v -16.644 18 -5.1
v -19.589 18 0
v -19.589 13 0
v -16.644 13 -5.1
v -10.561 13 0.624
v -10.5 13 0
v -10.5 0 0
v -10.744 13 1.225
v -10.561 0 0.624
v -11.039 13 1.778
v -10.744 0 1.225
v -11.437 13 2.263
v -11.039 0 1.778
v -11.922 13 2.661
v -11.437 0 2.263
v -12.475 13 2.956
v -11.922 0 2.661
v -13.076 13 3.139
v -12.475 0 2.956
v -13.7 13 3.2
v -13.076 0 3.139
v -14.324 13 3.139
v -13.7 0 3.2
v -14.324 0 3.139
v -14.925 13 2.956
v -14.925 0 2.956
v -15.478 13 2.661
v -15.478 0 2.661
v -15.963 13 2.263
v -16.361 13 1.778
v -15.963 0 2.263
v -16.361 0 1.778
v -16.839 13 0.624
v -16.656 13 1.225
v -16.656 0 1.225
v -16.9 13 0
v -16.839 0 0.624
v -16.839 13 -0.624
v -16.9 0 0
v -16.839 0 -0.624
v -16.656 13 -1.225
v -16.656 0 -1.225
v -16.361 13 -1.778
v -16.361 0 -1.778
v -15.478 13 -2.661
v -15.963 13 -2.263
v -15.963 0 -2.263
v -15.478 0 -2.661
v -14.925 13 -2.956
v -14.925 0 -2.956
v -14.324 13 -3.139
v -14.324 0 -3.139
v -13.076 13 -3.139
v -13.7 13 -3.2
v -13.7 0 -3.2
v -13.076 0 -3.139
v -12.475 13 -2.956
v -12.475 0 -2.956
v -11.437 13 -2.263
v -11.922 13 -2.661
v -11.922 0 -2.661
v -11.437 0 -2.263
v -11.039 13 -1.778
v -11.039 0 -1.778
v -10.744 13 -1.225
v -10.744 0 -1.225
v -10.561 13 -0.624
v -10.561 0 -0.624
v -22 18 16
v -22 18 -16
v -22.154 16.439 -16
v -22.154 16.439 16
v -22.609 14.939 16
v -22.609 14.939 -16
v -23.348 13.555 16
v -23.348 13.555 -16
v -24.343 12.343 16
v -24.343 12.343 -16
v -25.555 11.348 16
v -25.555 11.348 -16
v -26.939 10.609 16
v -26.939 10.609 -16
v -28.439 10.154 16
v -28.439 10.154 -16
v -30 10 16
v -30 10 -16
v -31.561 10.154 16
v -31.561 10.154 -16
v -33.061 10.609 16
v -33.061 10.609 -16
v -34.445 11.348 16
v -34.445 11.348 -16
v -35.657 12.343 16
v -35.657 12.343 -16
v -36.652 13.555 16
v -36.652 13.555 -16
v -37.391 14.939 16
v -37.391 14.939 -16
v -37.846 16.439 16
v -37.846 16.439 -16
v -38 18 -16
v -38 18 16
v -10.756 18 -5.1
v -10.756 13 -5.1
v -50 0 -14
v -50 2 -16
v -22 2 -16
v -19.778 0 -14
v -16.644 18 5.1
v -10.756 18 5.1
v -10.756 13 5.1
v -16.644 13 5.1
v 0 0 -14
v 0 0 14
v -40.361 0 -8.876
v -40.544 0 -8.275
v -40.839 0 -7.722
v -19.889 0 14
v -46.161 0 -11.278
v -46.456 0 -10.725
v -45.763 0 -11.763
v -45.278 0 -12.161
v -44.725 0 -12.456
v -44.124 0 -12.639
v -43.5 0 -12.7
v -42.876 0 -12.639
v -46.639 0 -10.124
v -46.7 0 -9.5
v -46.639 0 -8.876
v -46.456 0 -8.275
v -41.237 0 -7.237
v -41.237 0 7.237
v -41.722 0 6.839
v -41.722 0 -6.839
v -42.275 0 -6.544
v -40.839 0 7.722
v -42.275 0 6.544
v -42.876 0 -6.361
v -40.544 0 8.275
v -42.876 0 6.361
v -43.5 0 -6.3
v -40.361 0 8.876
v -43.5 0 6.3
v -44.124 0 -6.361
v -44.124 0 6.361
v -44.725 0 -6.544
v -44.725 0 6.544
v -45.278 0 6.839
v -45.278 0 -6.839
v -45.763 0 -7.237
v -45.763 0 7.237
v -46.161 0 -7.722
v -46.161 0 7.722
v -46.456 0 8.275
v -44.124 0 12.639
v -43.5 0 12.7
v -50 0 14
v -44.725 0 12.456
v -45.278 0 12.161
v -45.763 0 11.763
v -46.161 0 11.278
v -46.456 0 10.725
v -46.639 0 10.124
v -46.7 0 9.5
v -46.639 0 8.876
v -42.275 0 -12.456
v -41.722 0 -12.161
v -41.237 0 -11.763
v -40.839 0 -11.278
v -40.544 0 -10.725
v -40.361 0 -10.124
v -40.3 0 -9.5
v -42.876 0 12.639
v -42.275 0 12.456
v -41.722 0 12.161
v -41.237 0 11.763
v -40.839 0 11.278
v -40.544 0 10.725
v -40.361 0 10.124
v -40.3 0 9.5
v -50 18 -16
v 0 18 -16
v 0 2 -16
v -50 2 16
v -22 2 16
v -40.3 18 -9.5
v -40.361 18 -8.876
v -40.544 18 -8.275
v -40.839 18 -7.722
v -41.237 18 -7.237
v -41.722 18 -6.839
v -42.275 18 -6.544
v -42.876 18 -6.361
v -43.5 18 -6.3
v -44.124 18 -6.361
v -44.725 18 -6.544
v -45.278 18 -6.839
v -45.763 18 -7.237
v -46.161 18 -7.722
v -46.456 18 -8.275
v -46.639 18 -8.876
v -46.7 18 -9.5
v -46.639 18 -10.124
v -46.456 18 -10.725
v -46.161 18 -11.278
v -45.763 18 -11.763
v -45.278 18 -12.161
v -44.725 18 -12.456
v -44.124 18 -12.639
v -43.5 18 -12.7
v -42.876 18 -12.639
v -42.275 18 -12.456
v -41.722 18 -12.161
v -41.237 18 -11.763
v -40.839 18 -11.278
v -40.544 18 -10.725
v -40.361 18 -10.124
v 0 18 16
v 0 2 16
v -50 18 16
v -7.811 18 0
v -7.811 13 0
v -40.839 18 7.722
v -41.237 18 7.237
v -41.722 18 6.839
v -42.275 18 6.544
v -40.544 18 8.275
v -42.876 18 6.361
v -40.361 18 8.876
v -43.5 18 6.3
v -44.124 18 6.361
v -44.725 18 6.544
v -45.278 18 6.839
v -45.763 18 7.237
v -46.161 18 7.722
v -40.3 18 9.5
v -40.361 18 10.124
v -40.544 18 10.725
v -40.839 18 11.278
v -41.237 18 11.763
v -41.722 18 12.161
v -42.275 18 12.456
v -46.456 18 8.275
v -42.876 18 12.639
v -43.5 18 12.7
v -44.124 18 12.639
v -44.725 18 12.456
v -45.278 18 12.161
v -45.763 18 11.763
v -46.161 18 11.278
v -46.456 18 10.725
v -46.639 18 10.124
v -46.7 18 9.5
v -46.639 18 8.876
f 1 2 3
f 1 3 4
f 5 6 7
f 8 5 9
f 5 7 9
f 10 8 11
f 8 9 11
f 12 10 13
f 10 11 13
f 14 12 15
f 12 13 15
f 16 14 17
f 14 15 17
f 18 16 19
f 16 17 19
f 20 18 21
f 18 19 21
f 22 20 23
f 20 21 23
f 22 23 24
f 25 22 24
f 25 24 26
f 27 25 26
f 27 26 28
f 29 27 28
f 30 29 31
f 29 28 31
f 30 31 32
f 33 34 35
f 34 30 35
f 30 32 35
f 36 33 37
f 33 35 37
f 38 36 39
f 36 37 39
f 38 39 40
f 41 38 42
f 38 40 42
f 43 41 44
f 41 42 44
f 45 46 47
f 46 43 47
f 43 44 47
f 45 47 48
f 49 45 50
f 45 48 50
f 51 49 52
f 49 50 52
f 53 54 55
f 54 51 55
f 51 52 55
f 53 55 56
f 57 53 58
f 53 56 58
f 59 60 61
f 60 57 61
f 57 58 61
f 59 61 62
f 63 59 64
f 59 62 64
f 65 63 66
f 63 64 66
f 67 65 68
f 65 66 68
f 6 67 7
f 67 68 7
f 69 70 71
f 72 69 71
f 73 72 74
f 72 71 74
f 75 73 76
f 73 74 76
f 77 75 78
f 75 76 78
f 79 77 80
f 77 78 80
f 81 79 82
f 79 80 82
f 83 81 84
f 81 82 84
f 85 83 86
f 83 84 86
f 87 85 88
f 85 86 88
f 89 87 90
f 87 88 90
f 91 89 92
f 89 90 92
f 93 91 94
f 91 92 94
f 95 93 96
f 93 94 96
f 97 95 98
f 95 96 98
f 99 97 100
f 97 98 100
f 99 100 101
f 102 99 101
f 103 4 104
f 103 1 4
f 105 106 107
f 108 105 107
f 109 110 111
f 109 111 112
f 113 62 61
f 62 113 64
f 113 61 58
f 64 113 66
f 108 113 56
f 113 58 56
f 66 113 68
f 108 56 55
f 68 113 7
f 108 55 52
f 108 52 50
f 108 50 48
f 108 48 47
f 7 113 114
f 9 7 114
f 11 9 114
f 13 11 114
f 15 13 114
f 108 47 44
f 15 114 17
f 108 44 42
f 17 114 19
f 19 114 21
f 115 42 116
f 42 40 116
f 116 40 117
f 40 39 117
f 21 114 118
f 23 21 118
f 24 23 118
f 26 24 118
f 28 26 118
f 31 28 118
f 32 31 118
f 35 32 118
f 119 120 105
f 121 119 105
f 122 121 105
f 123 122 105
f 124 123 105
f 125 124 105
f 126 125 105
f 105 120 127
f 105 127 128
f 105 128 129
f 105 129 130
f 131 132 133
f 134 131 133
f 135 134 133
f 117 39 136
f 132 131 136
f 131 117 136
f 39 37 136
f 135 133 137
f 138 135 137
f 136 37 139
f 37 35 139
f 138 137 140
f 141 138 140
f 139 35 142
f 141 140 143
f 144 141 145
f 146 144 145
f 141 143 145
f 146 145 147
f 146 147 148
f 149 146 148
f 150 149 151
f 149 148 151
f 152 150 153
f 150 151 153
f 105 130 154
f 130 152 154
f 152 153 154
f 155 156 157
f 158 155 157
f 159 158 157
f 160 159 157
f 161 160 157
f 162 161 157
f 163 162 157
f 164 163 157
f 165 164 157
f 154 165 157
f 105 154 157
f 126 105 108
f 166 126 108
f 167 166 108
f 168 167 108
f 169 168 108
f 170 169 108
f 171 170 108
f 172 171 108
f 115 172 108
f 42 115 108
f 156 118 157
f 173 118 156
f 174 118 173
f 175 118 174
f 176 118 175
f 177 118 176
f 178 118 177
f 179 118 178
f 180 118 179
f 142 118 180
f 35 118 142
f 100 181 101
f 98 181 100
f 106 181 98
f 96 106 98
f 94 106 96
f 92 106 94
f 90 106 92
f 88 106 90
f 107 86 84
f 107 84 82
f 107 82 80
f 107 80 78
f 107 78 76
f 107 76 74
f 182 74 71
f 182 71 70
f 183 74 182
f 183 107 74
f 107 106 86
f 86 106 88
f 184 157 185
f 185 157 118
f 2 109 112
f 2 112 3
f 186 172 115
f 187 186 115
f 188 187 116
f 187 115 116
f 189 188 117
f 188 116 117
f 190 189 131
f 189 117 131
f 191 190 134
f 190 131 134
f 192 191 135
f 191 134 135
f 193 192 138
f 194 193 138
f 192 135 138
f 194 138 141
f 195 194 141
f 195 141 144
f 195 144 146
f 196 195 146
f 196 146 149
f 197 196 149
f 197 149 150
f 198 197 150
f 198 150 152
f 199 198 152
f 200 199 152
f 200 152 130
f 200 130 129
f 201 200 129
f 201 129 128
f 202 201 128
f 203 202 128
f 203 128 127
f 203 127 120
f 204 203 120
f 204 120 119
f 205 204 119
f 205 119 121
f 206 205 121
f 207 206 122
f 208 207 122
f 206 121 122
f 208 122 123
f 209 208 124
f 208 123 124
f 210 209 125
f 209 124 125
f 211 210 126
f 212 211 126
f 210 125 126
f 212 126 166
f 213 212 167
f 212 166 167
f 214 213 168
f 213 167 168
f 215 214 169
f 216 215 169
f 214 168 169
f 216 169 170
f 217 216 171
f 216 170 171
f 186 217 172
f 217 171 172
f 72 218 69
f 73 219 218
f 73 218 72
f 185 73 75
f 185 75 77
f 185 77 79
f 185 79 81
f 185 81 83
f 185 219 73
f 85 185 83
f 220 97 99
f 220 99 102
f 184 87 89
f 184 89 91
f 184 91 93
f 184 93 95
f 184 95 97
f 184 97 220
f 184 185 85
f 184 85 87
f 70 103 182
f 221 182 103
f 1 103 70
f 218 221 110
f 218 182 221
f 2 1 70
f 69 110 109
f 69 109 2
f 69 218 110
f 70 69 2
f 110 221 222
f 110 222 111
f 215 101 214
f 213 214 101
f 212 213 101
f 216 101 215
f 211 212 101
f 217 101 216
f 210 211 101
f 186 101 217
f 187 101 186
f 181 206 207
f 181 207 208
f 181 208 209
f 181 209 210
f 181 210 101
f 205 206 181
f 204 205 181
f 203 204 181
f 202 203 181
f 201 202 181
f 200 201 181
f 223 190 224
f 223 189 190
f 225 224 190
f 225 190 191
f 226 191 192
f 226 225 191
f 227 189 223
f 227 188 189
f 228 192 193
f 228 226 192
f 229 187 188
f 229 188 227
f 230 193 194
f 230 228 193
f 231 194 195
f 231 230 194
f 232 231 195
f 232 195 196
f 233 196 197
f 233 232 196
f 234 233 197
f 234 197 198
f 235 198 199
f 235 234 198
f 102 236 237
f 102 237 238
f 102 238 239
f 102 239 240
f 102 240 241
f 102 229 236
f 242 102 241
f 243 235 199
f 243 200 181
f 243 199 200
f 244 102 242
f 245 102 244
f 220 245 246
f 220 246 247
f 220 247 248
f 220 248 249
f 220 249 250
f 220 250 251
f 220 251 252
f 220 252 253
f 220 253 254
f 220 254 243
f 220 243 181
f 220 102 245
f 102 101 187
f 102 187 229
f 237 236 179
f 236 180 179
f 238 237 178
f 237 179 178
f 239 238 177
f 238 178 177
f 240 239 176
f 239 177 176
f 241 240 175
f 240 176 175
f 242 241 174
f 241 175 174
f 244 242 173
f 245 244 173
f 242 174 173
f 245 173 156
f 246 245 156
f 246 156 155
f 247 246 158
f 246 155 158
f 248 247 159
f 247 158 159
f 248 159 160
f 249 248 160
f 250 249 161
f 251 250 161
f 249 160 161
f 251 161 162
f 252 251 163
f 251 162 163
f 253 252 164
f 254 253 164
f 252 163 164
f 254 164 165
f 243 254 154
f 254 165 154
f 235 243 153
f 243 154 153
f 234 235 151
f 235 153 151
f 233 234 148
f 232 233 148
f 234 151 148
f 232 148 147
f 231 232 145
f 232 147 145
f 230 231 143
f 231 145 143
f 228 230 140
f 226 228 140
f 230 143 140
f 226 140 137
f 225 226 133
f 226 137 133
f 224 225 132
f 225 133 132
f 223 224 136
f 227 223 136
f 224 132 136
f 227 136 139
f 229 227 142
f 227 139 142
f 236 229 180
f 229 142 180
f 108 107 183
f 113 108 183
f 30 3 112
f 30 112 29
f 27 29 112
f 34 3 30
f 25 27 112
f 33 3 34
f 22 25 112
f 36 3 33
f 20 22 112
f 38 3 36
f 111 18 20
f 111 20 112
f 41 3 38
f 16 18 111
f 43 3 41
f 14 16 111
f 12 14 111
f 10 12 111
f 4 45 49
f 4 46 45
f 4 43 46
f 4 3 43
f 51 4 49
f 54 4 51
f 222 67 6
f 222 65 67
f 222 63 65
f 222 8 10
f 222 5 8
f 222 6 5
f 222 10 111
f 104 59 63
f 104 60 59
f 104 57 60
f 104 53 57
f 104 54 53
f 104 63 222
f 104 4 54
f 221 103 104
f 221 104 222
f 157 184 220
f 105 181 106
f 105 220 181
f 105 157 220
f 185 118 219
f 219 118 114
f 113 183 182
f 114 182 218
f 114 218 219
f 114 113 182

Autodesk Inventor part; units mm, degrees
ref_plane "YZ Plane" through (0, 0, 0) normal (1, 0, 0) x (0, 1, 0)
ref_plane "XZ Plane" through (0, 0, 0) normal (0, 1, 0) x (-1, 0, 0)
ref_plane "XY Plane" through (0, 0, 0) normal (0, 0, 1) x (1, 0, 0)
sketch "Sketch1" plane through (0, 0, 0) normal (0, 1, 0) x (-1, 0, 0)
  line L0 (-50, 16) -> (50, 16)
  line L1 (50, 16) -> (50, -16)
  line L2 (50, -16) -> (-50, -16)
  line L3 (-50, -16) -> (-50, 16)
  point P0 (0, 0)
  point P1 (-50, 0)
  point P2 (0, 16)
  dimension "d0" = 100
  dimension "d1" = 32
extrude "Extrusion1" add sketch "Sketch1" along normal blind 18
sketch "Sketch7" plane through (50, 0, -16) normal (0, 0, -1) x (-1, 0, 0)
  line L0 (100, 0) -> (0, 0) projected
  line L1 (100, 0) -> (100, 18) projected
  line L2 (0, 18) -> (100, 18) projected
  line L3 (0, 0) -> (0, 18) projected
  circle A0 centre (20, 18) radius 8
  line L4 (100, 18) -> (0, 18) projected
  circle A1 centre (80, 18) radius 8
  line L5 (20, 18) -> (80, 18) construction
  circle A2 centre (50, 18) radius 5
  point P0 (50, 0)
  dimension "d32" = 60
  dimension "d33" = 16
  dimension "d34" = 10
extrude "Extrusion7" cut sketch "Sketch7" against normal through all contours A1 L2 | L2 A1 | A0 L2 | L2 A0 | A2 L2 | L2 A2
sketch "Sketch8" plane through (50, 0, -16) normal (0, 0, -1) x (-1, 0, 0)
  arc A0 (72, 18) -> (88, 18) centre (80, 18) ccw projected
  line L0 (55, 18) -> (72, 18) projected
  arc A1 (45, 18) -> (55, 18) centre (50, 18) ccw projected
  line L1 (28, 18) -> (45, 18) projected
  arc A2 (12, 18) -> (28, 18) centre (20, 18) ccw projected
  line L2 (0, 18) -> (12, 18) projected
  line L3 (0, 0) -> (0, 18) projected
  line L4 (100, 0) -> (0, 0) projected
  line L5 (100, 0) -> (100, 18) projected
  line L6 (88, 18) -> (100, 18) projected
  circle A3 centre (50, 18) radius 12
  point P0 (50, 0)
  dimension "d37" = 24
extrude "Extrusion8" cut sketch "Sketch8" against normal blind 9 contours A3 L1 A1 L0 | L0 A1 L1 A3
sketch "Sketch9" plane through (-50, 0, 16) normal (0, 0, 1) x (1, 0, 0)
  arc A0 (12, 18) -> (28, 18) centre (20, 18) ccw projected
  line L0 (0, 18) -> (12, 18) projected
  line L1 (0, 0) -> (0, 18) projected
  line L2 (100, 0) -> (0, 0) projected
  line L3 (100, 0) -> (100, 18) projected
  line L4 (88, 18) -> (100, 18) projected
  arc A1 (72, 18) -> (88, 18) centre (80, 18) ccw projected
  line L5 (55, 18) -> (72, 18) projected
  arc A2 (45, 18) -> (55, 18) centre (50, 18) ccw projected
  line L6 (28, 18) -> (45, 18) projected
  arc A3 (45, 18) -> (55, 18) centre (50, 18) ccw projected
  circle A4 centre (50, 18) radius 12.5
  point P0 (50, 18)
  dimension "d49" = 25
extrude "Extrusion9" cut sketch "Sketch9" against normal blind 9 contours A4 L5 A2 L6 | L6 A2 L5 A4
sketch "Sketch11" plane through (0, 0, 0) normal (0, -1, 0) x (1, 0, 0)
  circle A0 centre (43.5, -9.5) radius 3
  circle A1 centre (43.5, 9.5) radius 3
  circle A2 centre (13.7, 0) radius 3
  circle A3 centre (-13.7, 0) radius 3
  circle A4 centre (-43.5, -9.5) radius 3
  circle A5 centre (-43.5, 9.5) radius 3
  circle A6 centre (43.5, 9.5) radius 3.2
  circle A7 centre (43.5, -9.5) radius 3.2
  circle A8 centre (13.7, 0) radius 3.2
  circle A9 centre (-13.7, 0) radius 3.2
  circle A10 centre (-43.5, -9.5) radius 3.2
  circle A11 centre (-43.5, 9.5) radius 3.2
  point P0 (0, 0)
  dimension "d50" = 0.2
extrude "Extrusion10" cut sketch "Sketch11" against normal through all contours A0 | A1 | A2 | A3 | A4 | A5 | A6 | A7 | A8 | A9 | A10 | A11
chamfer "Chamfer3" distance 2 angle 45 2 edges at (0, 0, -16) (0, 0, 16)
sketch "Sketch12" plane through (0, 18, 0) normal (0, 1, 0) x (1, 0, 0)
  circle A0 centre (-13.7, 0) radius 3.2
  circle A1 centre (13.7, 0) radius 3.2
  line L0 (10.7555, 5.1) -> (16.6445, 5.1)
  line L1 (16.6445, 5.1) -> (19.589, 0)
  line L2 (19.589, 0) -> (16.6445, -5.1)
  line L3 (16.6445, -5.1) -> (10.7555, -5.1)
  line L4 (10.7555, -5.1) -> (7.811, 0)
  line L5 (7.811, 0) -> (10.7555, 5.1)
  circle A2 centre (-13.7, 0) radius 3.2 projected
  line L6 (-10.7555, -5.1) -> (-16.6445, -5.1)
  line L7 (-16.6445, -5.1) -> (-19.589, 0)
  line L8 (-19.589, 0) -> (-16.6445, 5.1)
  line L9 (-16.6445, 5.1) -> (-10.7555, 5.1)
  line L10 (-10.7555, 5.1) -> (-7.811, 0)
  line L11 (-7.811, 0) -> (-10.7555, -5.1)
  point P0 (0, 0)
  dimension "d51" = 10.2
extrude "Extrusion11" cut sketch "Sketch12" against normal blind 5
sketch "Sketch13" plane through (0, 0, 0) normal (0, -1, 0) x (1, 0, 0)
  circle A0 centre (-43.5, 9.5) radius 3.2 construction
  circle A1 centre (-13.7, 0) radius 3.2 construction
  circle A2 centre (43.5, -9.5) radius 3.2 construction
  circle A3 centre (43.5, 9.5) radius 3.2 construction
  circle A4 centre (13.7, 0) radius 3.2 construction
  circle A5 centre (-43.5, -9.5) radius 3.2 construction
  line L0 (-50, 14) -> (50, 14) construction
  line L1 (-50, 14) -> (-50, -14) construction
  line L2 (50, -14) -> (-50, -14) construction
  line L3 (50, -14) -> (50, 14) construction
  line L4 (50, -16) -> (50, -14) construction
  line L5 (50, -14) -> (-50, -14) construction
  line L6 (-50, -14) -> (-50, -16) construction
  line L7 (-50, -16) -> (50, -16) construction
  line L8 (-50, 16) -> (-50, 14) construction
  line L9 (-50, 14) -> (50, 14) construction
  line L10 (50, 14) -> (50, 16) construction
  line L11 (50, 16) -> (-50, 16) construction
  line L12 (50, 16) -> (50, -16) projected
  line L13 (50, 16) -> (-50, 16) projected
  line L14 (50, -16) -> (0, -16)
  line L15 (0, -16) -> (0, 16)
  line L16 (0, 16) -> (50, 16)
  line L17 (50, 16) -> (50, -16)
  point P0 (0, 0)
extrude "Extrusion12" cut sketch "Sketch13" against normal through all
sketch "Sketch14" plane through (0, 18, 0) normal (0, 1, 0) x (1, 0, 0)
  line L0 (0, 7) -> (0, 16) construction
  line L1 (-12, 16) -> (0, 16) construction
  line L2 (-12, 7) -> (-12, 16) construction
  line L3 (-12, 7) -> (0, 7) construction
  line L4 (0, -16) -> (0, -7) construction
  line L5 (0, -7) -> (-12.5, -7) construction
  line L6 (-12.5, -16) -> (-12.5, -7) construction
  line L7 (0, -16) -> (-12.5, -16) construction
  line L8 (0, -7) -> (0, 7) construction
  line L9 (0, 7) -> (-5, 7) construction
  line L10 (-5, -7) -> (-5, 7) construction
  line L11 (-5, -7) -> (0, -7) construction
  line L12 (-7.811, 0) -> (-10.7555, -5.1) construction
  line L13 (-10.7555, -5.1) -> (-16.6445, -5.1) construction
  line L14 (-16.6445, -5.1) -> (-19.589, 0) construction
  line L15 (-19.589, 0) -> (-16.6445, 5.1) construction
  line L16 (-16.6445, 5.1) -> (-10.7555, 5.1) construction
  line L17 (-10.7555, 5.1) -> (-7.811, 0) construction
  line L18 (-12.5, -7) -> (-5, -7) construction
  line L19 (-5, -7) -> (-5, 7) construction
  line L20 (-5, 7) -> (-12, 7) construction
  line L21 (-12, 7) -> (-12, 16) construction
  line L22 (-12, 16) -> (-22, 16) construction
  line L23 (-22, 16) -> (-22, -16) construction
  line L24 (-22, -16) -> (-12.5, -16) construction
  line L25 (-12.5, -16) -> (-12.5, -7) construction
  line L26 (-5, 7) -> (-12, 7) projected
  line L27 (-22, 16) -> (-12, 7)
  line L28 (-12, 7) -> (-5, 7)
  line L29 (-5, 7) -> (-5, -7)
  line L30 (0, -7) -> (-12.5, -7) projected
  line L31 (-22, -16) -> (-38, -16) projected
  line L32 (-12.5, -7) -> (-22, -16)
  line L33 (0, -16) -> (-12.5, -16) projected
  line L34 (-22, -16) -> (0, -16)
  line L35 (0, 16) -> (0, 14) projected
  line L36 (0, -16) -> (0, 16)
  line L37 (-12, 16) -> (-22, 16) projected
  line L38 (0, 16) -> (-22, 16)
  point P0 (0, 0)
extrude "Extrusion13" add sketch "Sketch14" against normal up to surface (18 mm away)
chamfer "Chamfer4" distance 2 angle 45 2 edges at (-11, 0, 16) (-11, 0, -16)
properties part number "AXBv2" material "PC/ABS Plastic"
